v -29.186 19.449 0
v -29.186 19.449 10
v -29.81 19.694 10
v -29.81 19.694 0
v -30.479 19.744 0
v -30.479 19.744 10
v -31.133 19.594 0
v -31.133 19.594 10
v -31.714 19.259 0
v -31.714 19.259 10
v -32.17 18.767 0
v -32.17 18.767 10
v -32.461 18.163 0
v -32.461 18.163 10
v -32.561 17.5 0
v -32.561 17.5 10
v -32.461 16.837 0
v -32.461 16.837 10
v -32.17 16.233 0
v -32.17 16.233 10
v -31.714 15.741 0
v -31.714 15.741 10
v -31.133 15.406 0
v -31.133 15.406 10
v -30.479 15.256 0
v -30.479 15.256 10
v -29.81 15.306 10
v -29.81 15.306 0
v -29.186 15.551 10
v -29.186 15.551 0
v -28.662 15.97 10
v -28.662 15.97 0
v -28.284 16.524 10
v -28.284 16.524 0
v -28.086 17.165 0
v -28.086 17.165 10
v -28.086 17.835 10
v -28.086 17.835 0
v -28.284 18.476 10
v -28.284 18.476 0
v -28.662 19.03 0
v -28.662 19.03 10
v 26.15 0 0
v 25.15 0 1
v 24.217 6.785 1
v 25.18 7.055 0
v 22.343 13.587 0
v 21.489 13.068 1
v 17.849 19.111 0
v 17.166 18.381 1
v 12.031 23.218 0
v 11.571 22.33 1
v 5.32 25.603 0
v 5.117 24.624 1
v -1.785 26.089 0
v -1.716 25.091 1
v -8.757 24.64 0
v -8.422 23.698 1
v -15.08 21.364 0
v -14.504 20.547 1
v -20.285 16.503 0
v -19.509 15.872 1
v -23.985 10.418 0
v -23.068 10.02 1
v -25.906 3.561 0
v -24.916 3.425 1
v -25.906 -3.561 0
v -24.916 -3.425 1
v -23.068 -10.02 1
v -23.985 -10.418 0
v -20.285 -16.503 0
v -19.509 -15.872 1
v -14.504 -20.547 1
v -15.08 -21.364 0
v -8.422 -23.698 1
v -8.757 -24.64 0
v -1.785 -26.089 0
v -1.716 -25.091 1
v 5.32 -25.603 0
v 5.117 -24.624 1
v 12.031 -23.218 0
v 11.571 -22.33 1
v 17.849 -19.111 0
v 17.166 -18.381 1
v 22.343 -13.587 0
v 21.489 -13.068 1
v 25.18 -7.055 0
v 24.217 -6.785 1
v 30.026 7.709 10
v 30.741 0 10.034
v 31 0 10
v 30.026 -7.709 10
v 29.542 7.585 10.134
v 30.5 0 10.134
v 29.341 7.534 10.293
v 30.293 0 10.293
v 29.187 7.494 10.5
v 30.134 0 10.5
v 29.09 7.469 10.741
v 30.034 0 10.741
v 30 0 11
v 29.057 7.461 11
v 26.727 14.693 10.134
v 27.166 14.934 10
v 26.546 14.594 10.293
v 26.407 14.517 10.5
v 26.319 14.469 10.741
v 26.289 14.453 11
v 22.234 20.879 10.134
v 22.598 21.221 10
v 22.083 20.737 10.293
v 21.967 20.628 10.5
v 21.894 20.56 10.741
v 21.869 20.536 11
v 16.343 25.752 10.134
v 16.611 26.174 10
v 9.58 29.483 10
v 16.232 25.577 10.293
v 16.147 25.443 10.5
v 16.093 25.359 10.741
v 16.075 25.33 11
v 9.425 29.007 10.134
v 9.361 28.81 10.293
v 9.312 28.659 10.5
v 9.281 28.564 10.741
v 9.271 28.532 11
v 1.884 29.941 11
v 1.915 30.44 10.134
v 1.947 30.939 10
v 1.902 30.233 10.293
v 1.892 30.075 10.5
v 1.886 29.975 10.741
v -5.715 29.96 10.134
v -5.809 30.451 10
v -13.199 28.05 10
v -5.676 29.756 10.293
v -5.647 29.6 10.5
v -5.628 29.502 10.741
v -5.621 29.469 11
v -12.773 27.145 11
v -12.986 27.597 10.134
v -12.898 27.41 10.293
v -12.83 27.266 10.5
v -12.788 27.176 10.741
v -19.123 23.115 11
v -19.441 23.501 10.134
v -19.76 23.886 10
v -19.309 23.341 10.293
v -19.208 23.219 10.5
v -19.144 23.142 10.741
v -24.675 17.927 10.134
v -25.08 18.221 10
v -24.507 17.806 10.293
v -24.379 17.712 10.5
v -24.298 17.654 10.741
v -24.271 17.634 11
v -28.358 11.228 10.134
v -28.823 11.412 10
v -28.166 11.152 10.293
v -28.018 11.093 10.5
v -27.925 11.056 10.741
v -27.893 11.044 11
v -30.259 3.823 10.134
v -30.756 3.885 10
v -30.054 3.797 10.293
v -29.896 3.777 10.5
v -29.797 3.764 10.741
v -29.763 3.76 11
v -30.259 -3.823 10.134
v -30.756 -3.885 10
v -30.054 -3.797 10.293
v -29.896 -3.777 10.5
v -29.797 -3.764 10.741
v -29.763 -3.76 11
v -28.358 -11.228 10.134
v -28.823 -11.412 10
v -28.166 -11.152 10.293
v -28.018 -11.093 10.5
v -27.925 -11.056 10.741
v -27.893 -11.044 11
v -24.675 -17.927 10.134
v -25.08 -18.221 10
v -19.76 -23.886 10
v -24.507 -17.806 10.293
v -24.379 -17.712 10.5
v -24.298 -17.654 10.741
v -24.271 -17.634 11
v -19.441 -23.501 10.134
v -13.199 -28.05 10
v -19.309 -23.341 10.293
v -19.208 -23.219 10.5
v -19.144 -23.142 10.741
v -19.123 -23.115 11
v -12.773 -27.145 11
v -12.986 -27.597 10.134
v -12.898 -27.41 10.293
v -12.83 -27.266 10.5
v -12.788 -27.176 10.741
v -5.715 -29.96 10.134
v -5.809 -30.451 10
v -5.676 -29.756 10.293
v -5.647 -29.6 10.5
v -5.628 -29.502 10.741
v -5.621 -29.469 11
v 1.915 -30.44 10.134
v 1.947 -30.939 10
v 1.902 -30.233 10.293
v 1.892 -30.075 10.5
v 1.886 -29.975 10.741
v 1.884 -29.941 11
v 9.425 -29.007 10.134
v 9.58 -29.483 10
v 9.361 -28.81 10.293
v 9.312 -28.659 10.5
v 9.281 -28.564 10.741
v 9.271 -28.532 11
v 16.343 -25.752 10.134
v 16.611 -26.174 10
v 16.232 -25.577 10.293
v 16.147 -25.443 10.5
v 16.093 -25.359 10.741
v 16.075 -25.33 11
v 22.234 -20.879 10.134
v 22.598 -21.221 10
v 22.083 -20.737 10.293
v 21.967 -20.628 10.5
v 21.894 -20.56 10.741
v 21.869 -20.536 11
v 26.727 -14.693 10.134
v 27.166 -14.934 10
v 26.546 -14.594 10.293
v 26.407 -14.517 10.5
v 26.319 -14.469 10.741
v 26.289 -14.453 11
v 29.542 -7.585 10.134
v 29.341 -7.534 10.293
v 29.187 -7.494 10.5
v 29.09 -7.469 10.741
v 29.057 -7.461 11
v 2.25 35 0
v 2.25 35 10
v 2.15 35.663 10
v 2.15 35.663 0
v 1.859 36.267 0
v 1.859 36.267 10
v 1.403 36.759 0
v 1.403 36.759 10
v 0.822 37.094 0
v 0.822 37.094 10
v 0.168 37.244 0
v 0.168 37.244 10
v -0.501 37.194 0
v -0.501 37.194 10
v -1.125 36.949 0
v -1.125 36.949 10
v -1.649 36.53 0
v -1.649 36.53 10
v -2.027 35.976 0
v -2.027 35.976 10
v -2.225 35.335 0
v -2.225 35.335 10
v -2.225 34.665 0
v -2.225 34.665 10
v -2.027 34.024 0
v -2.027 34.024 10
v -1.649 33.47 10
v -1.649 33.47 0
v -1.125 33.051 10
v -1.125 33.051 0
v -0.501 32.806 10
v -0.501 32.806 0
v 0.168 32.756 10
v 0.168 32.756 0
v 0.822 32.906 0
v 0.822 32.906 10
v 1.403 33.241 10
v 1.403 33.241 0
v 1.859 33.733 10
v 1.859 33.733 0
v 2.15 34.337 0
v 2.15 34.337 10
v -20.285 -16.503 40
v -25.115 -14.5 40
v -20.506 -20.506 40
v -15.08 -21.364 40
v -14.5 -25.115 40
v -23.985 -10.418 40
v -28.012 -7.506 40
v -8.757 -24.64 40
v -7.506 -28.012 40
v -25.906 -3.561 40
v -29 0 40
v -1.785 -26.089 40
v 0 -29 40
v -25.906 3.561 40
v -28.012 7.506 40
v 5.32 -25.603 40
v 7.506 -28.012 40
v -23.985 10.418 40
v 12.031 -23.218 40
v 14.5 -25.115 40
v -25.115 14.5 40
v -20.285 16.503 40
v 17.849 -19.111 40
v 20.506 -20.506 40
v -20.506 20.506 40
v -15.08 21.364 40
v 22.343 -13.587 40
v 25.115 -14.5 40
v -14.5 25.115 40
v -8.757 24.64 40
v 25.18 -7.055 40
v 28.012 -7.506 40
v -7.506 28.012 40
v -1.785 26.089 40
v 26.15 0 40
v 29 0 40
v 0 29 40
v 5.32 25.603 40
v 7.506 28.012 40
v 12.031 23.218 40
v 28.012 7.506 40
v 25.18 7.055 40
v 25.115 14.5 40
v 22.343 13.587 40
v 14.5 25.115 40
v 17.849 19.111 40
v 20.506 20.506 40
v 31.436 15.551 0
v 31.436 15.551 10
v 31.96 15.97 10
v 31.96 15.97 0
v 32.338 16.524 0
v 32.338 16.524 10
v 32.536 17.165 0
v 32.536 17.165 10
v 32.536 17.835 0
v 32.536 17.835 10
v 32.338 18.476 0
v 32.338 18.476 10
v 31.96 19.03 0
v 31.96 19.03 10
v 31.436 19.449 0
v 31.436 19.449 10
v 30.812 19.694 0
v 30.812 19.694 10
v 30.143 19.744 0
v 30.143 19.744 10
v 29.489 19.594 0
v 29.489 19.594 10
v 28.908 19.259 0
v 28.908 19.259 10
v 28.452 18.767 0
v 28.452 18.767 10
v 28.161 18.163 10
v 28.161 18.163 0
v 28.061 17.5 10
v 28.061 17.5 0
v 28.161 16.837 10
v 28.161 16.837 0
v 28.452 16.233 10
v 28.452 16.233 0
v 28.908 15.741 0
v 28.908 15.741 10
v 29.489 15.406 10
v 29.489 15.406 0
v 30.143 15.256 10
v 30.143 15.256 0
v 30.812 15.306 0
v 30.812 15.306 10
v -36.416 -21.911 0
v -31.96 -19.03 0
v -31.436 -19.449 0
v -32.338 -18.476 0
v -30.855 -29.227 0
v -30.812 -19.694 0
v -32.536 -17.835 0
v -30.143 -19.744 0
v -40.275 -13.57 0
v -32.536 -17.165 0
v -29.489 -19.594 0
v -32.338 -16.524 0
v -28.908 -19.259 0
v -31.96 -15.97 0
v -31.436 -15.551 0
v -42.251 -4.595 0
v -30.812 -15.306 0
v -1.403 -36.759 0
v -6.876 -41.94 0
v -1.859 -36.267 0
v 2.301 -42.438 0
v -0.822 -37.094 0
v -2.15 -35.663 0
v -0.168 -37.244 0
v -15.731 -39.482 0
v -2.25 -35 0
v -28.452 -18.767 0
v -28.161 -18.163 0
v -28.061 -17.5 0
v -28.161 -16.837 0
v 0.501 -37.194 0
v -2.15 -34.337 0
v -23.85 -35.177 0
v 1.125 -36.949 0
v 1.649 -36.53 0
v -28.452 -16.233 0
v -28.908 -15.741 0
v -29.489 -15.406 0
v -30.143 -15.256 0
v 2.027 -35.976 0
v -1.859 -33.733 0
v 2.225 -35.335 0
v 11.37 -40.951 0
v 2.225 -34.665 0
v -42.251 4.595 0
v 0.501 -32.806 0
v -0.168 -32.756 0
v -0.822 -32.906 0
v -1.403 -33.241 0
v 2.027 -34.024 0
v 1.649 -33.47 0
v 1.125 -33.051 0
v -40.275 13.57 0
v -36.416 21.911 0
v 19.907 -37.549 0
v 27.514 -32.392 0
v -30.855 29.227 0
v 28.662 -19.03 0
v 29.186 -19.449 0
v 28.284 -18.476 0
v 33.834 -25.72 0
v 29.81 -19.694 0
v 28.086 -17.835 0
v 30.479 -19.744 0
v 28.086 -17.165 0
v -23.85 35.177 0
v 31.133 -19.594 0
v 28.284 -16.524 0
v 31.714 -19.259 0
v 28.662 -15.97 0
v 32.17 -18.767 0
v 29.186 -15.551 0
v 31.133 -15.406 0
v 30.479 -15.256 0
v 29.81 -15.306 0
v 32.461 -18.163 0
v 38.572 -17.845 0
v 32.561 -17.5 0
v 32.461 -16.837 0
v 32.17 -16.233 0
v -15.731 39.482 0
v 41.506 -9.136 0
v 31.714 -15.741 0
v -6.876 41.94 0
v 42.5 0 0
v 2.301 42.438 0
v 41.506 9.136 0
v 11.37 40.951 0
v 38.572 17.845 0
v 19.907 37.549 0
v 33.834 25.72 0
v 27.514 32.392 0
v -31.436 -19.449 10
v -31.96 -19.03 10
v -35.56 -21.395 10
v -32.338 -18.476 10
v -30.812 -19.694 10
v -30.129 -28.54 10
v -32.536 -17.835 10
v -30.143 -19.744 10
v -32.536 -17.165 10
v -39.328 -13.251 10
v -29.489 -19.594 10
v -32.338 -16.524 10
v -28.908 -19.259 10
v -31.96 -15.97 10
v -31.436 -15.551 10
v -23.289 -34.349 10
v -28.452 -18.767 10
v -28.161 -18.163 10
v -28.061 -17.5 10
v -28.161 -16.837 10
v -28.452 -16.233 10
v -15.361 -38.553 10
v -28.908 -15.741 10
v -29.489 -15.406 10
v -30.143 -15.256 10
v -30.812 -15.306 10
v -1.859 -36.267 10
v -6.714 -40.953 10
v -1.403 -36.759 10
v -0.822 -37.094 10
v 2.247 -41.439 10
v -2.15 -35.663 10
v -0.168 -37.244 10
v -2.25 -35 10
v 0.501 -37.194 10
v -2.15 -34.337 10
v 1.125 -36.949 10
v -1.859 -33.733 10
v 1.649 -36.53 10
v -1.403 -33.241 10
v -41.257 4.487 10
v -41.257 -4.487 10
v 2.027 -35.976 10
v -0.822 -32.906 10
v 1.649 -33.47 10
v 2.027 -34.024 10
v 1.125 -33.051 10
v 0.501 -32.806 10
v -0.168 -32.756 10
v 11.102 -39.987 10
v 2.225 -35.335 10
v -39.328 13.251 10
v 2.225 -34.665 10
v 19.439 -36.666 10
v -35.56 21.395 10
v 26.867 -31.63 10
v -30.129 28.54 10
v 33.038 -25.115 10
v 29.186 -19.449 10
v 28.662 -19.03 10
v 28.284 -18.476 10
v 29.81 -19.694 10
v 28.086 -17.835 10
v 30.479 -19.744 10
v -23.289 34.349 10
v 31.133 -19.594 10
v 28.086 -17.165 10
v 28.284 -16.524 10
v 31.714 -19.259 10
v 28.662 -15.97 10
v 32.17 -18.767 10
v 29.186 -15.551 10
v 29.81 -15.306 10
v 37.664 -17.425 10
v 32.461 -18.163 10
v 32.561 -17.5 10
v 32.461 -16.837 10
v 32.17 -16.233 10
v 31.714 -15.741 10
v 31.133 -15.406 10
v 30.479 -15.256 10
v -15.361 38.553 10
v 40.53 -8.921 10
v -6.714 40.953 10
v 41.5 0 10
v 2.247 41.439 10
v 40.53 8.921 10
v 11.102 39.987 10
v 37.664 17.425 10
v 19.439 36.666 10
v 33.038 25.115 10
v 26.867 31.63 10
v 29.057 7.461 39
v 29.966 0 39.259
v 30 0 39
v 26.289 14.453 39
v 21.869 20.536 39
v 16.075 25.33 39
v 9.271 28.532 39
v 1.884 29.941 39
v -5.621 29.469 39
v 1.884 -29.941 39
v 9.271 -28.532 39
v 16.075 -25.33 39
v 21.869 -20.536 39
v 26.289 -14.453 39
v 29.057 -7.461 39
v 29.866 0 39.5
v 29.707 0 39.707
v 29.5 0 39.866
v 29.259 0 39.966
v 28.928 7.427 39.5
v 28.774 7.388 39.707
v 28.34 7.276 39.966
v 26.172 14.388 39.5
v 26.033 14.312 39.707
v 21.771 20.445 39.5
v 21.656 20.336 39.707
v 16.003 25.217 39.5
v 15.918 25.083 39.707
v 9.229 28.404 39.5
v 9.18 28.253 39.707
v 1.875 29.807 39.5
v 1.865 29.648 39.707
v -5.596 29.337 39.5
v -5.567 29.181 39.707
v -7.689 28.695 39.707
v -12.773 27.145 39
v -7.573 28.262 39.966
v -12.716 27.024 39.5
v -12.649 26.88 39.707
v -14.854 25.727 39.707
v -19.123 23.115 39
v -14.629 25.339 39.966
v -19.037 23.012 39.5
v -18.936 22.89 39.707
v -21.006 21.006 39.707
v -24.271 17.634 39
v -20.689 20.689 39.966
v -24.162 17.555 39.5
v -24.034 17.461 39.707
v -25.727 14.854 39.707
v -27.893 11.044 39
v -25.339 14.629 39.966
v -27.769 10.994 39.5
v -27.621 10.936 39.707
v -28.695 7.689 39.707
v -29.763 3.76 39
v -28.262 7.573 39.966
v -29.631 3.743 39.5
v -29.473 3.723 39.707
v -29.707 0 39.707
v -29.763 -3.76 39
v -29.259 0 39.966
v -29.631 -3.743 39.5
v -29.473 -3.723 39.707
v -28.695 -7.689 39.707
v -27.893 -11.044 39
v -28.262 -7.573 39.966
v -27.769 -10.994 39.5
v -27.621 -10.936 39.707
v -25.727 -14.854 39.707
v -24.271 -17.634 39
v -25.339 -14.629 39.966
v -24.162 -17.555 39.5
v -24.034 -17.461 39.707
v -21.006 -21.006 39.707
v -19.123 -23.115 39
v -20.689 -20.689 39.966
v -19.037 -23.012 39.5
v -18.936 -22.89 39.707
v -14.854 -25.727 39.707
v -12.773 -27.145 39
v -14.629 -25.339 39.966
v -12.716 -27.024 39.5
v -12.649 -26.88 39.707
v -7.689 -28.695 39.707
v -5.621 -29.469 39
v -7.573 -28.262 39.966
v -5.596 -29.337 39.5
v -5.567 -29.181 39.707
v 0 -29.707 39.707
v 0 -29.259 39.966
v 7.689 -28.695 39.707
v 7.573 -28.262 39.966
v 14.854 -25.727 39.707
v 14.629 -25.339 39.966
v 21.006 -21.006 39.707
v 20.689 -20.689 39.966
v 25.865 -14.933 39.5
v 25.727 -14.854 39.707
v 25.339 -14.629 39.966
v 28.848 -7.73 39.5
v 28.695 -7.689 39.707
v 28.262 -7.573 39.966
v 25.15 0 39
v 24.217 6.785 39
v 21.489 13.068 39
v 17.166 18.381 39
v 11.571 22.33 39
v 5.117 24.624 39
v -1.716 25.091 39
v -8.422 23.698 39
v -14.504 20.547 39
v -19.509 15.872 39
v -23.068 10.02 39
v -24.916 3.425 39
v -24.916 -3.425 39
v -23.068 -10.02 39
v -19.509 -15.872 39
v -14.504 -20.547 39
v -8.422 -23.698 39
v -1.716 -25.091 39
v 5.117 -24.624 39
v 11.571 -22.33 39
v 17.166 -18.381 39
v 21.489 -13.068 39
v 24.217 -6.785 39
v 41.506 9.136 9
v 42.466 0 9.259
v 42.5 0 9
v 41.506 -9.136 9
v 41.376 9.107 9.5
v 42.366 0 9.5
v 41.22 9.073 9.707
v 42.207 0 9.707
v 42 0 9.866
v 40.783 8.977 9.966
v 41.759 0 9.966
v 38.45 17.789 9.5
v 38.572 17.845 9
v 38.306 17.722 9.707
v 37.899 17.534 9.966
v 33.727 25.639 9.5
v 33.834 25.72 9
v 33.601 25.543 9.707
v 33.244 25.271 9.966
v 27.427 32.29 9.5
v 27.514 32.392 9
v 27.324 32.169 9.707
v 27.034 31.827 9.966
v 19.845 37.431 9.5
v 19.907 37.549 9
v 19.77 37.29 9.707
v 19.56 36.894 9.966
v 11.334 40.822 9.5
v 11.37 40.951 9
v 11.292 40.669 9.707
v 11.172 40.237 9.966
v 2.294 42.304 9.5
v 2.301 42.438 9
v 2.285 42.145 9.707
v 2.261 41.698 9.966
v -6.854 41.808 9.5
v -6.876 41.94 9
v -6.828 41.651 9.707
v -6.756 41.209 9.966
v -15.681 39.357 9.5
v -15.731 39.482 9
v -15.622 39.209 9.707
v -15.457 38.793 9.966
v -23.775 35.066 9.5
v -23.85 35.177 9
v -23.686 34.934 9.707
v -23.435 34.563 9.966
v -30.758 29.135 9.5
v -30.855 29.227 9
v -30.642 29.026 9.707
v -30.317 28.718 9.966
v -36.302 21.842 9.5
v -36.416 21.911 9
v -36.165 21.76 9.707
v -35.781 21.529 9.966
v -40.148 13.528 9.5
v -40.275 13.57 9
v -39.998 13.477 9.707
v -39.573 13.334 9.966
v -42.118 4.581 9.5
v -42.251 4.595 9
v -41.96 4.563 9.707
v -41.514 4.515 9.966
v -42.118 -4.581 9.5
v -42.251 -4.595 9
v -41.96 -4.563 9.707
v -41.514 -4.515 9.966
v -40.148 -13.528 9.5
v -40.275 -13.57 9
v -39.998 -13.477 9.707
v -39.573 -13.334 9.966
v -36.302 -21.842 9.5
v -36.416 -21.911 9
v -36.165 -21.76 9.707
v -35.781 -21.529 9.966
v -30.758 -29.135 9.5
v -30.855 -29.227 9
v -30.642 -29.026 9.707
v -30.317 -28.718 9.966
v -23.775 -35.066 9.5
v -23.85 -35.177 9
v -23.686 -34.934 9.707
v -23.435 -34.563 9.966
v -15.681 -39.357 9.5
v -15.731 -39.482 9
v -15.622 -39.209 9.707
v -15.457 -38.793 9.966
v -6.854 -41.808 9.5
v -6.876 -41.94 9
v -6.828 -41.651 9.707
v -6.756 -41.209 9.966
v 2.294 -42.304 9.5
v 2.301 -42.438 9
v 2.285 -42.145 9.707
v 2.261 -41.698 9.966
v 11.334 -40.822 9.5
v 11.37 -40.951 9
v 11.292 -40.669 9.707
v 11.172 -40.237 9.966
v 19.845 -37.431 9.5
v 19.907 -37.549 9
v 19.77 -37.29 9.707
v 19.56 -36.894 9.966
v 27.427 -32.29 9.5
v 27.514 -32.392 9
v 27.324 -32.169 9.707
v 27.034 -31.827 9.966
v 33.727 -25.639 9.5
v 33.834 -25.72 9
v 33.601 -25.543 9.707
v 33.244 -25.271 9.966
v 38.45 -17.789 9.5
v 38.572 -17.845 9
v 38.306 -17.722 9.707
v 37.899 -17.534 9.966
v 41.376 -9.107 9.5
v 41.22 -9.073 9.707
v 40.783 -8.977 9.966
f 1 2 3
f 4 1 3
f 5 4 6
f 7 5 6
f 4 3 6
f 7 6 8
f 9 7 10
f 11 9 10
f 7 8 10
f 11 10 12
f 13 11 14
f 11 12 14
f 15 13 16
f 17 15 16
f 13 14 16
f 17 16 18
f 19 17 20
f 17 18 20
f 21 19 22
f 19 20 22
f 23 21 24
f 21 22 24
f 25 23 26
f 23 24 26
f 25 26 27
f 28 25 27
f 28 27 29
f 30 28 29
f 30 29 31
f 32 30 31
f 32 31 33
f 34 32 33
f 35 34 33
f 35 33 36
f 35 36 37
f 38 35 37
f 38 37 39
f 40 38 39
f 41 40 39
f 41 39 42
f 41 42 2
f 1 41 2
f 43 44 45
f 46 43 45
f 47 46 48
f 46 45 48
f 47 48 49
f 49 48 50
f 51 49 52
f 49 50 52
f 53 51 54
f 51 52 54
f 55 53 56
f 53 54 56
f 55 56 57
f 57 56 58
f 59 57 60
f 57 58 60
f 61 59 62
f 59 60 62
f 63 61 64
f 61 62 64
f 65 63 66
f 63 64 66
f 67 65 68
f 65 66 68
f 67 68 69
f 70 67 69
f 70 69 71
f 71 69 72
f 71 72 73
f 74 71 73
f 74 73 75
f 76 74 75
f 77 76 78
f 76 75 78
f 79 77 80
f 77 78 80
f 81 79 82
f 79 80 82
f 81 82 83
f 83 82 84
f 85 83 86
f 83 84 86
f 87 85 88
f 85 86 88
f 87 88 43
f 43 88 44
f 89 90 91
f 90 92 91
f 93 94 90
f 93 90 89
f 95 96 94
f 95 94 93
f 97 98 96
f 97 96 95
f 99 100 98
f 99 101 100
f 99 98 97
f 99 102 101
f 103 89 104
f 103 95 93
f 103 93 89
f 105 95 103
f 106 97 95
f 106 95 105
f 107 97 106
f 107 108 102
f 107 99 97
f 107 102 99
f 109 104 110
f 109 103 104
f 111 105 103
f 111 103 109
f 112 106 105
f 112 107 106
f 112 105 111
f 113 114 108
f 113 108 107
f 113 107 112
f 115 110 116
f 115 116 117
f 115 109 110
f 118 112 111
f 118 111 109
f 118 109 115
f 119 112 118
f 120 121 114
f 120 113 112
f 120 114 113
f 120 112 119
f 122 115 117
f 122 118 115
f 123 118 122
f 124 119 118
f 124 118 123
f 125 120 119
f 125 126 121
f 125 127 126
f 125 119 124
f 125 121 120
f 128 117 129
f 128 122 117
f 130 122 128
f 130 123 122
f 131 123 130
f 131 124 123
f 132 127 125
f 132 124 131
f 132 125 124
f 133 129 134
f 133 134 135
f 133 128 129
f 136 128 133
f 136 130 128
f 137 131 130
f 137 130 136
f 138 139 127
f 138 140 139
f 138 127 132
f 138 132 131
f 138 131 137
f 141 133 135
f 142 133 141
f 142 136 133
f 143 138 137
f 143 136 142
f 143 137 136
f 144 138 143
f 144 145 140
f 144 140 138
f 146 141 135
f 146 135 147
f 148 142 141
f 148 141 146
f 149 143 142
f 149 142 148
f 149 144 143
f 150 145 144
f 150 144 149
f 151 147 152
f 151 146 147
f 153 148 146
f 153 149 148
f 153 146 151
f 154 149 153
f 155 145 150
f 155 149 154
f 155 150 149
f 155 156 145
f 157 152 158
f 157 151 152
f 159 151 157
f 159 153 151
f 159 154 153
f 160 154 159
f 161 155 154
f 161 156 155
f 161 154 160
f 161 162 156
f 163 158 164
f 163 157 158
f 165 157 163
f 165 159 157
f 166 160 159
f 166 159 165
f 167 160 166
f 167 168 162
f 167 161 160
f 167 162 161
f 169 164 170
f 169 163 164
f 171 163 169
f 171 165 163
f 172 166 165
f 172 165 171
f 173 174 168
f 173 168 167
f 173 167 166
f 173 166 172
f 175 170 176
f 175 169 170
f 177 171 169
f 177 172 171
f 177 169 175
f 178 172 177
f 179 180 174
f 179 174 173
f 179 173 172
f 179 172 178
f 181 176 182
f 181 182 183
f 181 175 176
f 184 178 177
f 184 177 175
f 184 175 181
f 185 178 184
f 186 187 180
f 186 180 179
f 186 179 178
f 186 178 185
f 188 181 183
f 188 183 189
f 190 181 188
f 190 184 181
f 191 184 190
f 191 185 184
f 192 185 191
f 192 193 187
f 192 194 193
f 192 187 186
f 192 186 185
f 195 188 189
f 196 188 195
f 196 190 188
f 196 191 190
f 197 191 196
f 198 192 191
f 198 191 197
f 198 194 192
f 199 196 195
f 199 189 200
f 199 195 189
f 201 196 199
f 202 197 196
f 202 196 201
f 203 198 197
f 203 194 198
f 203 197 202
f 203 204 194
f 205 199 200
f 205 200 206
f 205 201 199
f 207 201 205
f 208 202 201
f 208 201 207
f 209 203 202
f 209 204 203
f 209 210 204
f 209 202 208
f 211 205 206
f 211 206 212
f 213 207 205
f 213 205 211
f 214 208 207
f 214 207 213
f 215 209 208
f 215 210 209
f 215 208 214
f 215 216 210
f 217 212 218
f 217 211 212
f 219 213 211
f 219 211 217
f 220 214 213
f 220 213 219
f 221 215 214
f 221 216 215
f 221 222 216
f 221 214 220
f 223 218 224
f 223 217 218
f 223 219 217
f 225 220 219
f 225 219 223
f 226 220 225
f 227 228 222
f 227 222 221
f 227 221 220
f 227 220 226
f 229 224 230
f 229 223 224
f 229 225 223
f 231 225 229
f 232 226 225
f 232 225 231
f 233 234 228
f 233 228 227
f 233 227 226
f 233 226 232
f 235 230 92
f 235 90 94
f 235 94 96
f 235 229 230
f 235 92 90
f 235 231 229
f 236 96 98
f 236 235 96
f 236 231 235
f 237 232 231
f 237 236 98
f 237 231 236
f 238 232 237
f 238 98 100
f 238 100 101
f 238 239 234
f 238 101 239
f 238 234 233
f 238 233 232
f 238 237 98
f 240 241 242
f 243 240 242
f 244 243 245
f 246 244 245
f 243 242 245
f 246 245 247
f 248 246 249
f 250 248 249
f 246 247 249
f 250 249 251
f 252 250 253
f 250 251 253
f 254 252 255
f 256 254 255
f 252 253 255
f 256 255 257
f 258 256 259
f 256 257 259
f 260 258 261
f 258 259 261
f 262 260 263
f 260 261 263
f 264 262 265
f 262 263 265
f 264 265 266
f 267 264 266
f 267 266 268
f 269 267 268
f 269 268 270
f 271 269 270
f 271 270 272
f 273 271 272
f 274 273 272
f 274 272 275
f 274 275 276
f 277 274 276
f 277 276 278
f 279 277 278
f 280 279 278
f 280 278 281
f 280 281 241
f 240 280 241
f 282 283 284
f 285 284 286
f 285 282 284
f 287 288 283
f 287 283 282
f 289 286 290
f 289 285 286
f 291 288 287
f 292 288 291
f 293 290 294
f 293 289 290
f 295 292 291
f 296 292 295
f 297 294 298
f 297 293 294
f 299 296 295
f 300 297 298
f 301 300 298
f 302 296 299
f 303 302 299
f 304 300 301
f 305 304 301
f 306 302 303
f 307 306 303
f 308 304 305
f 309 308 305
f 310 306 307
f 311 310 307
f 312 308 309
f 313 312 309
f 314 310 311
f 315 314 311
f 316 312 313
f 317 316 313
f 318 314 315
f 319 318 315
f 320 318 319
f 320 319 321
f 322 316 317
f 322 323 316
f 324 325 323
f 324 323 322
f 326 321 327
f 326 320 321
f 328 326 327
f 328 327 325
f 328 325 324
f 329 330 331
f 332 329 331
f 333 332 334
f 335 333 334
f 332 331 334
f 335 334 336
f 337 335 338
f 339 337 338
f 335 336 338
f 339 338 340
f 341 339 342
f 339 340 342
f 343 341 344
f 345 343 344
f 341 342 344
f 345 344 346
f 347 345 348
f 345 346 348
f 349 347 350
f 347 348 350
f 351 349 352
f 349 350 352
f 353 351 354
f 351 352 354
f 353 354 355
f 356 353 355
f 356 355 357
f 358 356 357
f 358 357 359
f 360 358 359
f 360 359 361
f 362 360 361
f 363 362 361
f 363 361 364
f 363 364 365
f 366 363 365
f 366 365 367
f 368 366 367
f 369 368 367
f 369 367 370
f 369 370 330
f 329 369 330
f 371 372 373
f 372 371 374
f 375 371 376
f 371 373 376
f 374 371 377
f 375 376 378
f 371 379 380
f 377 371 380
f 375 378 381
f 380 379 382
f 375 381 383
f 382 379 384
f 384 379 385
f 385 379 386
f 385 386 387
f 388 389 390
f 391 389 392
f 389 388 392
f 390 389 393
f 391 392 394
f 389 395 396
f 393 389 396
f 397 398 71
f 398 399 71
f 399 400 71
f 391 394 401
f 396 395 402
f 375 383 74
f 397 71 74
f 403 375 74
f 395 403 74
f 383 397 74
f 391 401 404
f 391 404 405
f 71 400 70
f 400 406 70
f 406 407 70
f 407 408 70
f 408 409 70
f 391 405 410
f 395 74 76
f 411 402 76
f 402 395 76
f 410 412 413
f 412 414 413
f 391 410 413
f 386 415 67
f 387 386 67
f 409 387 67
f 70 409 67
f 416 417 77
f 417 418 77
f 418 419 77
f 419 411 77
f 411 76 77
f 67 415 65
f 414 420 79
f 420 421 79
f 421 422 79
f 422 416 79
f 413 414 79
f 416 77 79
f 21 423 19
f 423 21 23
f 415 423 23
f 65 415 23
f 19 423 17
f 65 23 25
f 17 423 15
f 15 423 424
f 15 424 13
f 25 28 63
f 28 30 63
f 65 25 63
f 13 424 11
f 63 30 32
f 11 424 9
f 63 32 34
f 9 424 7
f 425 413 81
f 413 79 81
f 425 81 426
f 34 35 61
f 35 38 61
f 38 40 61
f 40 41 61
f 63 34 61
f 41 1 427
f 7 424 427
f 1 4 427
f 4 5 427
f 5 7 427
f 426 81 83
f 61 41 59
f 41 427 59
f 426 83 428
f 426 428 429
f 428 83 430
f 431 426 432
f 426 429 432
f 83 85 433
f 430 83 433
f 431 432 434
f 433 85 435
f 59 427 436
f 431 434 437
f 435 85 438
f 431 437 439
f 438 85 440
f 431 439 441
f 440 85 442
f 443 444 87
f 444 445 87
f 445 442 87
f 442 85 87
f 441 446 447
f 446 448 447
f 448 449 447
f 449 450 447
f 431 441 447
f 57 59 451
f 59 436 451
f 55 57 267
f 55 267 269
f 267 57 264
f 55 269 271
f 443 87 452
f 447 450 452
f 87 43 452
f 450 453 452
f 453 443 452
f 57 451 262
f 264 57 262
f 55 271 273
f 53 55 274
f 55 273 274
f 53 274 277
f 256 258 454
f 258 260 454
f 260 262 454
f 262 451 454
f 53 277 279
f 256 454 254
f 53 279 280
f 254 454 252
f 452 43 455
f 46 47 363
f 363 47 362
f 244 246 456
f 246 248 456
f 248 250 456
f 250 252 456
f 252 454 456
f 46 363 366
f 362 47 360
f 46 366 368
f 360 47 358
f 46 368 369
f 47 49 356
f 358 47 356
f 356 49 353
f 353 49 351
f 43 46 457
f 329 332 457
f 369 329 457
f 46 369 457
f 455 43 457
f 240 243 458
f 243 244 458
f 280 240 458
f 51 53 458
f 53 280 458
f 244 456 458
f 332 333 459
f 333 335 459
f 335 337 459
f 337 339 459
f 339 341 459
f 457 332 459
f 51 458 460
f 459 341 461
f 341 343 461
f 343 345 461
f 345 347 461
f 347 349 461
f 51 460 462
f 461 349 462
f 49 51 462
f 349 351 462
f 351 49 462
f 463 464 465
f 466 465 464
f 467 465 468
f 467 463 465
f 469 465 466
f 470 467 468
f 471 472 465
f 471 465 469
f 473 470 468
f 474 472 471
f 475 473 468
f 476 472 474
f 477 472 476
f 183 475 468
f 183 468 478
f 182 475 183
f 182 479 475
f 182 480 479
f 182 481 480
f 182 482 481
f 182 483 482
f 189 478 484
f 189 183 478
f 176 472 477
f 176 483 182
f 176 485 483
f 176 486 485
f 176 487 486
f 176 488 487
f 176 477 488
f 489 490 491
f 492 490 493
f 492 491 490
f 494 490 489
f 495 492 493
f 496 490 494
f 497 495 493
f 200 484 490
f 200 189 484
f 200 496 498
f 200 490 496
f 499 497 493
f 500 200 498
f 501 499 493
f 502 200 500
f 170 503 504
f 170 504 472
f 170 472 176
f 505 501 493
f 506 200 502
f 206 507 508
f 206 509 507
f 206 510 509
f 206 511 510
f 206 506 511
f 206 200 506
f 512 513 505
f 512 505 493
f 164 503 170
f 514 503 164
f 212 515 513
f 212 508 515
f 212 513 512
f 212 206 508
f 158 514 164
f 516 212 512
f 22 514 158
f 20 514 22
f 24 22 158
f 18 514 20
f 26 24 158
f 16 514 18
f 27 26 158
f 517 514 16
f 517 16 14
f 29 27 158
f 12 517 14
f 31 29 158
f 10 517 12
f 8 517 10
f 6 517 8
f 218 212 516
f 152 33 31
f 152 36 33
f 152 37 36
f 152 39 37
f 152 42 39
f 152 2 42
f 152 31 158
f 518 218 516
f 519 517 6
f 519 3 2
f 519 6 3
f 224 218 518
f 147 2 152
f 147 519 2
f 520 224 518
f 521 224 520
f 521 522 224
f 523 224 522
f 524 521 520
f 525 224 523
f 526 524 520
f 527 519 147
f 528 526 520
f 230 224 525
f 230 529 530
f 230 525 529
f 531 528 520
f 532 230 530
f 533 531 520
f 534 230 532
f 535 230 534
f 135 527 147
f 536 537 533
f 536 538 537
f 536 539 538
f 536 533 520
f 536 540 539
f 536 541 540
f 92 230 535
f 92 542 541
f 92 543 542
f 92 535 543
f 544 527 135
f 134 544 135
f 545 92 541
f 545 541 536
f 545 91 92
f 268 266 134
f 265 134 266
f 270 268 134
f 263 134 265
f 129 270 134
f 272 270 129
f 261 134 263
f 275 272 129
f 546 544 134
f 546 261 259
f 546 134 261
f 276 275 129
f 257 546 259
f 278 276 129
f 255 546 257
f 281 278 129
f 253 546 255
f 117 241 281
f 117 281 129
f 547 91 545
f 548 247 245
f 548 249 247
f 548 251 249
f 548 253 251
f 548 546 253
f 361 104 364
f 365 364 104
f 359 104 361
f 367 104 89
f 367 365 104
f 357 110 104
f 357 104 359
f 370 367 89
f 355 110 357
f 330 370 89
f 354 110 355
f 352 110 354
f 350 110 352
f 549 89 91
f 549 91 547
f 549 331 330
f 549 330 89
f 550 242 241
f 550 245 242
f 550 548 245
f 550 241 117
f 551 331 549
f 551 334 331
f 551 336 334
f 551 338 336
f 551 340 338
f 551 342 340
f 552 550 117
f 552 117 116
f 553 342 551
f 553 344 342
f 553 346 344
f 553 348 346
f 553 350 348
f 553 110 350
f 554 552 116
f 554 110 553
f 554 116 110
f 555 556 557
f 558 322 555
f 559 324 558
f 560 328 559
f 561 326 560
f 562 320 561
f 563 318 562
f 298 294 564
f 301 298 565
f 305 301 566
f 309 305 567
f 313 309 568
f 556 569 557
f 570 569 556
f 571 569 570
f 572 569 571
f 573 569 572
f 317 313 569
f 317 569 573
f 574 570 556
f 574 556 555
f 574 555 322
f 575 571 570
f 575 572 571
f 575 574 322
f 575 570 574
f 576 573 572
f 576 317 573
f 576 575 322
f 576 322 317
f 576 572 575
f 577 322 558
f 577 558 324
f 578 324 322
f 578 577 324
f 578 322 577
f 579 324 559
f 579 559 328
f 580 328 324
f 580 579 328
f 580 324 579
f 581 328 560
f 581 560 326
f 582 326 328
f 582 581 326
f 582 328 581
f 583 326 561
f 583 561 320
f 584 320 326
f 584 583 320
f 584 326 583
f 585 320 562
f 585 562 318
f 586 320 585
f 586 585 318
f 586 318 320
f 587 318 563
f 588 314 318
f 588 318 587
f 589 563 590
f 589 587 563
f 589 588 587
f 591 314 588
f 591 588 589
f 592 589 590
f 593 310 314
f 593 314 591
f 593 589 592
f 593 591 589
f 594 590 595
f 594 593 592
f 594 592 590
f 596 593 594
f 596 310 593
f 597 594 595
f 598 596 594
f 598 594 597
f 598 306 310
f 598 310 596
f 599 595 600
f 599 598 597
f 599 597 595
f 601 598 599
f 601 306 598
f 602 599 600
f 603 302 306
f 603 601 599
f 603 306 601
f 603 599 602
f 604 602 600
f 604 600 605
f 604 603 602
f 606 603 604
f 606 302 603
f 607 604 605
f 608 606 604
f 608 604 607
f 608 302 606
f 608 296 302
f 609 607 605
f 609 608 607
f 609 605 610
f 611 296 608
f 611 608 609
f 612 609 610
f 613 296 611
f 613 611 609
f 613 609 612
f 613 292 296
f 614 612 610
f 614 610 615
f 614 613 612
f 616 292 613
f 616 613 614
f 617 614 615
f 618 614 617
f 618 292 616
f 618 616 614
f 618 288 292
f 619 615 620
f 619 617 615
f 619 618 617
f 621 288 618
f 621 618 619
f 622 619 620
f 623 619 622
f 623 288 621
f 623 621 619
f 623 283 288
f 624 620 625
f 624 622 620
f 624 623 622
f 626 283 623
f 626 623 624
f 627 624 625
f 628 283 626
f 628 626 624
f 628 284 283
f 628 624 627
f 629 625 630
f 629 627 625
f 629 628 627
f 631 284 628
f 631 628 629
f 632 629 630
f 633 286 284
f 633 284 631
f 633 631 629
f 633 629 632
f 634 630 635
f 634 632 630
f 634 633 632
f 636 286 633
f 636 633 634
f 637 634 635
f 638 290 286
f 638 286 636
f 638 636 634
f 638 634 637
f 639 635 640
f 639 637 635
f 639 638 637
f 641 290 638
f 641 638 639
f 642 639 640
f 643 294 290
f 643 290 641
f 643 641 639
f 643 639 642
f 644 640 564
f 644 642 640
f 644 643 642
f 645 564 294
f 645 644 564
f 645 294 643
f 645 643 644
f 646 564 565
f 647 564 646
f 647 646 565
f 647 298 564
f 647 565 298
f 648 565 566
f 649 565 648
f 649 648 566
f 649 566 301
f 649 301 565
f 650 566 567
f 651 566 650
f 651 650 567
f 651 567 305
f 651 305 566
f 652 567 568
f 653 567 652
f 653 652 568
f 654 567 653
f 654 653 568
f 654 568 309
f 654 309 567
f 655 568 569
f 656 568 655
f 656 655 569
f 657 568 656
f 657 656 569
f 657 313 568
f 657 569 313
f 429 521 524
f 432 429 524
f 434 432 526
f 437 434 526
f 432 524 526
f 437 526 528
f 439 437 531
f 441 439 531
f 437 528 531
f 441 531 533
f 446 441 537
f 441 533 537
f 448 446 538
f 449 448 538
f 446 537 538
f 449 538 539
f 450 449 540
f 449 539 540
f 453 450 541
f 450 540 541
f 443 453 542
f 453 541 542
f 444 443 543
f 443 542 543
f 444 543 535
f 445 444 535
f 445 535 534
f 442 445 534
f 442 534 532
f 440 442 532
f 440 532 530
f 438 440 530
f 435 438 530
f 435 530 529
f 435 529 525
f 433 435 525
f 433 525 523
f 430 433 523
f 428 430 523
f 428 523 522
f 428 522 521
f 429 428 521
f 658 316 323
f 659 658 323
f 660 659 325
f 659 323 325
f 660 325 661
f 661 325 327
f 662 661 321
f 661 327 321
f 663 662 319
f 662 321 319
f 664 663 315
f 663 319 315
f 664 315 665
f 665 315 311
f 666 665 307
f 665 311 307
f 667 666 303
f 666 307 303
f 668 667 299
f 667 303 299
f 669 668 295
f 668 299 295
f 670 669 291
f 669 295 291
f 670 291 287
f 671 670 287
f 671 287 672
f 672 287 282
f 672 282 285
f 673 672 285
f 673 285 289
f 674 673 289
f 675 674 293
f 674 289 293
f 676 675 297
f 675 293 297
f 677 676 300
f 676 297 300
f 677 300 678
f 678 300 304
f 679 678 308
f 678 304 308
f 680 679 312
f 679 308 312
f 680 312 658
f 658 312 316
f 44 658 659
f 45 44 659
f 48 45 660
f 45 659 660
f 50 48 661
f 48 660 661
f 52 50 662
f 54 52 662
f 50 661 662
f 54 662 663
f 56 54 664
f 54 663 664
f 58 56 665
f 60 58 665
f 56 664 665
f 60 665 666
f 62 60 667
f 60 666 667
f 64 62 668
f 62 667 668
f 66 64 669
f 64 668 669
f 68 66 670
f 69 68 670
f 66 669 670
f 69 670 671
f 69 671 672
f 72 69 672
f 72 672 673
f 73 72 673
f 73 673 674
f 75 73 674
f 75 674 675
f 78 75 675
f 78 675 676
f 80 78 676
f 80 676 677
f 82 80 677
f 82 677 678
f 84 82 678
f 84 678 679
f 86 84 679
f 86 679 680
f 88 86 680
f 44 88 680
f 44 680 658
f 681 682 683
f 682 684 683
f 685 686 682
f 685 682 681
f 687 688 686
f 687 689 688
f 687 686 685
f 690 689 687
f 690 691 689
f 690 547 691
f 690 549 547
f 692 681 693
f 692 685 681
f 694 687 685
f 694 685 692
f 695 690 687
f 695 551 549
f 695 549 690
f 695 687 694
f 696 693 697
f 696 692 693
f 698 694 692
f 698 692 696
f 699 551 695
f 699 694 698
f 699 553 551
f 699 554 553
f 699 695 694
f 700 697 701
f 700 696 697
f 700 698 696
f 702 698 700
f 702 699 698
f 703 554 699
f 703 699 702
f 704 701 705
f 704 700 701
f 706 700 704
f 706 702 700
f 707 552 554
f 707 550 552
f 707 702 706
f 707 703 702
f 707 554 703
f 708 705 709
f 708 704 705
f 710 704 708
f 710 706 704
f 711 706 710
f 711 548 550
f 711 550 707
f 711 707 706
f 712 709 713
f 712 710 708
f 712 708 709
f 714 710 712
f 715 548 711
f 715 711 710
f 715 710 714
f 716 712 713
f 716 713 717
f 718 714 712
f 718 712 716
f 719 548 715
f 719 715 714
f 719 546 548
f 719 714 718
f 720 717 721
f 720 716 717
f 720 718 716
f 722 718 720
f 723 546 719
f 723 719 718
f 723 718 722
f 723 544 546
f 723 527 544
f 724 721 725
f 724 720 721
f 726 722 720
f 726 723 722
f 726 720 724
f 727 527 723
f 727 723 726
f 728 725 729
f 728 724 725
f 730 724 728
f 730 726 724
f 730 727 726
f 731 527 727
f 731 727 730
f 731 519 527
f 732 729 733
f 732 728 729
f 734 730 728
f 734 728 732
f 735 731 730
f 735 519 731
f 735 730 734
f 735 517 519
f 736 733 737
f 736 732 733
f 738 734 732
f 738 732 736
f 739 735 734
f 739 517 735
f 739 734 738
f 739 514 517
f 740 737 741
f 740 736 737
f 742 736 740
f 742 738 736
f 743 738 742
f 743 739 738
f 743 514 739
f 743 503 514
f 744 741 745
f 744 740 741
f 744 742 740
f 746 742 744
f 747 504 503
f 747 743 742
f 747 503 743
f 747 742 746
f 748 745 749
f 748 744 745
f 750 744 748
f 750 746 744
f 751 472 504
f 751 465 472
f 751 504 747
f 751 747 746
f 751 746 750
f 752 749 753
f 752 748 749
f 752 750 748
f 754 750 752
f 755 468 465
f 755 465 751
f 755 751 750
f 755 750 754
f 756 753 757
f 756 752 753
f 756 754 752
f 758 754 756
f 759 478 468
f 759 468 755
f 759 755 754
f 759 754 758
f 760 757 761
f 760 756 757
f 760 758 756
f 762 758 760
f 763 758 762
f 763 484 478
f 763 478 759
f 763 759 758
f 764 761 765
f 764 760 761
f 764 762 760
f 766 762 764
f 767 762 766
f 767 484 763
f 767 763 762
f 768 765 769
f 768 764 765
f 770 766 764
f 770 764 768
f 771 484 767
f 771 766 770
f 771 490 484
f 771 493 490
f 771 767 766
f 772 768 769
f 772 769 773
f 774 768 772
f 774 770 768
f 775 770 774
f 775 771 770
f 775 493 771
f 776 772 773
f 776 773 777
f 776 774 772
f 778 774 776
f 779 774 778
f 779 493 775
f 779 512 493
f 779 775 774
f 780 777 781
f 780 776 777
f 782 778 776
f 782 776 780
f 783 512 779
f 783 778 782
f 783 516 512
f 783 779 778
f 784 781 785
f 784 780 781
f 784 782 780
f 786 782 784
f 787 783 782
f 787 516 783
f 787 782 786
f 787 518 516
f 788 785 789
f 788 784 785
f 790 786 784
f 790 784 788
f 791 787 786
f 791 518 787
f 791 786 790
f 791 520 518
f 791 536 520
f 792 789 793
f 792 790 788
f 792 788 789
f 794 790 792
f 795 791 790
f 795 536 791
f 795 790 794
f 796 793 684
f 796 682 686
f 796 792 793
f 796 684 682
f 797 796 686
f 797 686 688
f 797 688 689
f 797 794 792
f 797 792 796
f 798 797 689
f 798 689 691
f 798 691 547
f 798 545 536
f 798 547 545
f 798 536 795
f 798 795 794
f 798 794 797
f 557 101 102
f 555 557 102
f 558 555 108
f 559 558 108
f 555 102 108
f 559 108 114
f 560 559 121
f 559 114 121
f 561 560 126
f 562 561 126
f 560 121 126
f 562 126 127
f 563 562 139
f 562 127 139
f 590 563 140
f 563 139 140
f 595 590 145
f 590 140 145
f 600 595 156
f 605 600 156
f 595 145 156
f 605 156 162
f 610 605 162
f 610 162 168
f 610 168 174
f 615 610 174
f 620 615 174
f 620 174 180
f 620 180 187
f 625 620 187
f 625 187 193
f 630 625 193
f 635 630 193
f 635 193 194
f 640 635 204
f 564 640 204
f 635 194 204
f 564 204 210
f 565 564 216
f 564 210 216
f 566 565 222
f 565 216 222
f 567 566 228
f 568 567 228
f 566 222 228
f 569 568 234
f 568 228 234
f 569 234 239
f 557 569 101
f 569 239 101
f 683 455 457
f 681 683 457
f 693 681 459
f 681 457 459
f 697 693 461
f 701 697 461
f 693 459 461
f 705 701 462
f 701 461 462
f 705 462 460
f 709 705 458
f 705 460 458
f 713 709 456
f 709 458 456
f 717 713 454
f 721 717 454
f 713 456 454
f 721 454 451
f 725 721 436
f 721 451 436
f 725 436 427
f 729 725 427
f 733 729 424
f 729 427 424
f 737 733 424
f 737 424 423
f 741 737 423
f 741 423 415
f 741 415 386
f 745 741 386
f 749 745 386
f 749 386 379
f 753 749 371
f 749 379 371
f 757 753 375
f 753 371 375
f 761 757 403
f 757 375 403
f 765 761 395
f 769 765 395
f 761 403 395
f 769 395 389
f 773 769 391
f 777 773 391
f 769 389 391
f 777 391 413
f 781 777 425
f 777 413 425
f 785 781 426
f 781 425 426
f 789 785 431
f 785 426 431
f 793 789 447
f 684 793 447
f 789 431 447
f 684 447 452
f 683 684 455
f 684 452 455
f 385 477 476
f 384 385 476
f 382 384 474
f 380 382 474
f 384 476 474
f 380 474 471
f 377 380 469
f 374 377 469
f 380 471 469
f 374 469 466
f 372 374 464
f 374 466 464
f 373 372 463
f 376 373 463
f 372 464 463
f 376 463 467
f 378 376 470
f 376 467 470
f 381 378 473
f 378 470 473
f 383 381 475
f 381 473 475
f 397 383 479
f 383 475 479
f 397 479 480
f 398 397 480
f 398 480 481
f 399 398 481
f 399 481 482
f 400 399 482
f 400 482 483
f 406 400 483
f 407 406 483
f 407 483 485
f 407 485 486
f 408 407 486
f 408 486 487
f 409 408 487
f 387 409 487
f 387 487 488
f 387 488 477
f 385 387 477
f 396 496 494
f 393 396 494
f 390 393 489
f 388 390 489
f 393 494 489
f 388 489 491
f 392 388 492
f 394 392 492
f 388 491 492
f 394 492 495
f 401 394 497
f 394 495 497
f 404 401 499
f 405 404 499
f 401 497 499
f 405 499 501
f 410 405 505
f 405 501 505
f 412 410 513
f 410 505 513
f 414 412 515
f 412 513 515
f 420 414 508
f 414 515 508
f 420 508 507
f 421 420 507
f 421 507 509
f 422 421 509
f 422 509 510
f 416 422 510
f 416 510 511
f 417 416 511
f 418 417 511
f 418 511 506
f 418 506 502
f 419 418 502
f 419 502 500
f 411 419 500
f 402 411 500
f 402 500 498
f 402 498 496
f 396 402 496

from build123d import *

# Parameters (mm, degrees)
SKETCH1_R           = 42.5
BOSS_EXTRUDE1_DEPTH = 10
SKETCH2_R           = 30
BOSS_EXTRUDE2_DEPTH = 30
SKETCH3_R           = 25.15
CUT_EXTRUDE1_DEPTH  = 73.197645391
CHAMFER1_SIZE       = 1
FILLET1_R           = 1
SKETCH4_R           = 2.25
CUT_EXTRUDE2_DEPTH  = 68.175144276
CIRPATTERN1_COUNT   = 6


with BuildPart() as part:
    # Sketch1 → Boss-Extrude1 (new body)
    with BuildSketch(Plane.XY):
        Circle(SKETCH1_R)
    extrude(amount=BOSS_EXTRUDE1_DEPTH)

    # Sketch2 → Boss-Extrude2 (add)
    with BuildSketch(Plane.XY.offset(10)):
        Circle(SKETCH2_R)
    extrude(amount=BOSS_EXTRUDE2_DEPTH)

    # Sketch3 → Cut-Extrude1 (cut, through all)
    with BuildSketch(Plane.XY.offset(40)):
        Circle(SKETCH3_R)
    extrude(amount=-CUT_EXTRUDE1_DEPTH, mode=Mode.SUBTRACT)

    # Chamfer1
    chamfer1_edges = [part.edges().sort_by_distance(p)[0] for p in [
        (-25.15, 0, 0),
        (-25.15, 0, 40),
    ]]
    chamfer(chamfer1_edges, length=CHAMFER1_SIZE)

    # Fillet1
    fillet1_edges = [part.edges().sort_by_distance(p)[0] for p in [
        (-42.5, 0, 10),
        (-30, 0, 10),
        (-30, 0, 40),
    ]]
    fillet(fillet1_edges, radius=FILLET1_R)

    # Sketch4 → Cut-Extrude2 (cut, through all)
    with BuildSketch(Plane.XY.offset(10)):
        with Locations((0, 35)):
            Circle(SKETCH4_R)
    cut_extrude2 = extrude(amount=-CUT_EXTRUDE2_DEPTH, mode=Mode.SUBTRACT)

    # CirPattern1: Cut-Extrude2 ×6 about axis
    cirpattern1_axis = Axis((0, 0, 0), (0, 0, 1))
    for i in range(1, CIRPATTERN1_COUNT):
        add(cut_extrude2.rotate(cirpattern1_axis, i * 360 / CIRPATTERN1_COUNT), mode=Mode.SUBTRACT)


solid = part.part
